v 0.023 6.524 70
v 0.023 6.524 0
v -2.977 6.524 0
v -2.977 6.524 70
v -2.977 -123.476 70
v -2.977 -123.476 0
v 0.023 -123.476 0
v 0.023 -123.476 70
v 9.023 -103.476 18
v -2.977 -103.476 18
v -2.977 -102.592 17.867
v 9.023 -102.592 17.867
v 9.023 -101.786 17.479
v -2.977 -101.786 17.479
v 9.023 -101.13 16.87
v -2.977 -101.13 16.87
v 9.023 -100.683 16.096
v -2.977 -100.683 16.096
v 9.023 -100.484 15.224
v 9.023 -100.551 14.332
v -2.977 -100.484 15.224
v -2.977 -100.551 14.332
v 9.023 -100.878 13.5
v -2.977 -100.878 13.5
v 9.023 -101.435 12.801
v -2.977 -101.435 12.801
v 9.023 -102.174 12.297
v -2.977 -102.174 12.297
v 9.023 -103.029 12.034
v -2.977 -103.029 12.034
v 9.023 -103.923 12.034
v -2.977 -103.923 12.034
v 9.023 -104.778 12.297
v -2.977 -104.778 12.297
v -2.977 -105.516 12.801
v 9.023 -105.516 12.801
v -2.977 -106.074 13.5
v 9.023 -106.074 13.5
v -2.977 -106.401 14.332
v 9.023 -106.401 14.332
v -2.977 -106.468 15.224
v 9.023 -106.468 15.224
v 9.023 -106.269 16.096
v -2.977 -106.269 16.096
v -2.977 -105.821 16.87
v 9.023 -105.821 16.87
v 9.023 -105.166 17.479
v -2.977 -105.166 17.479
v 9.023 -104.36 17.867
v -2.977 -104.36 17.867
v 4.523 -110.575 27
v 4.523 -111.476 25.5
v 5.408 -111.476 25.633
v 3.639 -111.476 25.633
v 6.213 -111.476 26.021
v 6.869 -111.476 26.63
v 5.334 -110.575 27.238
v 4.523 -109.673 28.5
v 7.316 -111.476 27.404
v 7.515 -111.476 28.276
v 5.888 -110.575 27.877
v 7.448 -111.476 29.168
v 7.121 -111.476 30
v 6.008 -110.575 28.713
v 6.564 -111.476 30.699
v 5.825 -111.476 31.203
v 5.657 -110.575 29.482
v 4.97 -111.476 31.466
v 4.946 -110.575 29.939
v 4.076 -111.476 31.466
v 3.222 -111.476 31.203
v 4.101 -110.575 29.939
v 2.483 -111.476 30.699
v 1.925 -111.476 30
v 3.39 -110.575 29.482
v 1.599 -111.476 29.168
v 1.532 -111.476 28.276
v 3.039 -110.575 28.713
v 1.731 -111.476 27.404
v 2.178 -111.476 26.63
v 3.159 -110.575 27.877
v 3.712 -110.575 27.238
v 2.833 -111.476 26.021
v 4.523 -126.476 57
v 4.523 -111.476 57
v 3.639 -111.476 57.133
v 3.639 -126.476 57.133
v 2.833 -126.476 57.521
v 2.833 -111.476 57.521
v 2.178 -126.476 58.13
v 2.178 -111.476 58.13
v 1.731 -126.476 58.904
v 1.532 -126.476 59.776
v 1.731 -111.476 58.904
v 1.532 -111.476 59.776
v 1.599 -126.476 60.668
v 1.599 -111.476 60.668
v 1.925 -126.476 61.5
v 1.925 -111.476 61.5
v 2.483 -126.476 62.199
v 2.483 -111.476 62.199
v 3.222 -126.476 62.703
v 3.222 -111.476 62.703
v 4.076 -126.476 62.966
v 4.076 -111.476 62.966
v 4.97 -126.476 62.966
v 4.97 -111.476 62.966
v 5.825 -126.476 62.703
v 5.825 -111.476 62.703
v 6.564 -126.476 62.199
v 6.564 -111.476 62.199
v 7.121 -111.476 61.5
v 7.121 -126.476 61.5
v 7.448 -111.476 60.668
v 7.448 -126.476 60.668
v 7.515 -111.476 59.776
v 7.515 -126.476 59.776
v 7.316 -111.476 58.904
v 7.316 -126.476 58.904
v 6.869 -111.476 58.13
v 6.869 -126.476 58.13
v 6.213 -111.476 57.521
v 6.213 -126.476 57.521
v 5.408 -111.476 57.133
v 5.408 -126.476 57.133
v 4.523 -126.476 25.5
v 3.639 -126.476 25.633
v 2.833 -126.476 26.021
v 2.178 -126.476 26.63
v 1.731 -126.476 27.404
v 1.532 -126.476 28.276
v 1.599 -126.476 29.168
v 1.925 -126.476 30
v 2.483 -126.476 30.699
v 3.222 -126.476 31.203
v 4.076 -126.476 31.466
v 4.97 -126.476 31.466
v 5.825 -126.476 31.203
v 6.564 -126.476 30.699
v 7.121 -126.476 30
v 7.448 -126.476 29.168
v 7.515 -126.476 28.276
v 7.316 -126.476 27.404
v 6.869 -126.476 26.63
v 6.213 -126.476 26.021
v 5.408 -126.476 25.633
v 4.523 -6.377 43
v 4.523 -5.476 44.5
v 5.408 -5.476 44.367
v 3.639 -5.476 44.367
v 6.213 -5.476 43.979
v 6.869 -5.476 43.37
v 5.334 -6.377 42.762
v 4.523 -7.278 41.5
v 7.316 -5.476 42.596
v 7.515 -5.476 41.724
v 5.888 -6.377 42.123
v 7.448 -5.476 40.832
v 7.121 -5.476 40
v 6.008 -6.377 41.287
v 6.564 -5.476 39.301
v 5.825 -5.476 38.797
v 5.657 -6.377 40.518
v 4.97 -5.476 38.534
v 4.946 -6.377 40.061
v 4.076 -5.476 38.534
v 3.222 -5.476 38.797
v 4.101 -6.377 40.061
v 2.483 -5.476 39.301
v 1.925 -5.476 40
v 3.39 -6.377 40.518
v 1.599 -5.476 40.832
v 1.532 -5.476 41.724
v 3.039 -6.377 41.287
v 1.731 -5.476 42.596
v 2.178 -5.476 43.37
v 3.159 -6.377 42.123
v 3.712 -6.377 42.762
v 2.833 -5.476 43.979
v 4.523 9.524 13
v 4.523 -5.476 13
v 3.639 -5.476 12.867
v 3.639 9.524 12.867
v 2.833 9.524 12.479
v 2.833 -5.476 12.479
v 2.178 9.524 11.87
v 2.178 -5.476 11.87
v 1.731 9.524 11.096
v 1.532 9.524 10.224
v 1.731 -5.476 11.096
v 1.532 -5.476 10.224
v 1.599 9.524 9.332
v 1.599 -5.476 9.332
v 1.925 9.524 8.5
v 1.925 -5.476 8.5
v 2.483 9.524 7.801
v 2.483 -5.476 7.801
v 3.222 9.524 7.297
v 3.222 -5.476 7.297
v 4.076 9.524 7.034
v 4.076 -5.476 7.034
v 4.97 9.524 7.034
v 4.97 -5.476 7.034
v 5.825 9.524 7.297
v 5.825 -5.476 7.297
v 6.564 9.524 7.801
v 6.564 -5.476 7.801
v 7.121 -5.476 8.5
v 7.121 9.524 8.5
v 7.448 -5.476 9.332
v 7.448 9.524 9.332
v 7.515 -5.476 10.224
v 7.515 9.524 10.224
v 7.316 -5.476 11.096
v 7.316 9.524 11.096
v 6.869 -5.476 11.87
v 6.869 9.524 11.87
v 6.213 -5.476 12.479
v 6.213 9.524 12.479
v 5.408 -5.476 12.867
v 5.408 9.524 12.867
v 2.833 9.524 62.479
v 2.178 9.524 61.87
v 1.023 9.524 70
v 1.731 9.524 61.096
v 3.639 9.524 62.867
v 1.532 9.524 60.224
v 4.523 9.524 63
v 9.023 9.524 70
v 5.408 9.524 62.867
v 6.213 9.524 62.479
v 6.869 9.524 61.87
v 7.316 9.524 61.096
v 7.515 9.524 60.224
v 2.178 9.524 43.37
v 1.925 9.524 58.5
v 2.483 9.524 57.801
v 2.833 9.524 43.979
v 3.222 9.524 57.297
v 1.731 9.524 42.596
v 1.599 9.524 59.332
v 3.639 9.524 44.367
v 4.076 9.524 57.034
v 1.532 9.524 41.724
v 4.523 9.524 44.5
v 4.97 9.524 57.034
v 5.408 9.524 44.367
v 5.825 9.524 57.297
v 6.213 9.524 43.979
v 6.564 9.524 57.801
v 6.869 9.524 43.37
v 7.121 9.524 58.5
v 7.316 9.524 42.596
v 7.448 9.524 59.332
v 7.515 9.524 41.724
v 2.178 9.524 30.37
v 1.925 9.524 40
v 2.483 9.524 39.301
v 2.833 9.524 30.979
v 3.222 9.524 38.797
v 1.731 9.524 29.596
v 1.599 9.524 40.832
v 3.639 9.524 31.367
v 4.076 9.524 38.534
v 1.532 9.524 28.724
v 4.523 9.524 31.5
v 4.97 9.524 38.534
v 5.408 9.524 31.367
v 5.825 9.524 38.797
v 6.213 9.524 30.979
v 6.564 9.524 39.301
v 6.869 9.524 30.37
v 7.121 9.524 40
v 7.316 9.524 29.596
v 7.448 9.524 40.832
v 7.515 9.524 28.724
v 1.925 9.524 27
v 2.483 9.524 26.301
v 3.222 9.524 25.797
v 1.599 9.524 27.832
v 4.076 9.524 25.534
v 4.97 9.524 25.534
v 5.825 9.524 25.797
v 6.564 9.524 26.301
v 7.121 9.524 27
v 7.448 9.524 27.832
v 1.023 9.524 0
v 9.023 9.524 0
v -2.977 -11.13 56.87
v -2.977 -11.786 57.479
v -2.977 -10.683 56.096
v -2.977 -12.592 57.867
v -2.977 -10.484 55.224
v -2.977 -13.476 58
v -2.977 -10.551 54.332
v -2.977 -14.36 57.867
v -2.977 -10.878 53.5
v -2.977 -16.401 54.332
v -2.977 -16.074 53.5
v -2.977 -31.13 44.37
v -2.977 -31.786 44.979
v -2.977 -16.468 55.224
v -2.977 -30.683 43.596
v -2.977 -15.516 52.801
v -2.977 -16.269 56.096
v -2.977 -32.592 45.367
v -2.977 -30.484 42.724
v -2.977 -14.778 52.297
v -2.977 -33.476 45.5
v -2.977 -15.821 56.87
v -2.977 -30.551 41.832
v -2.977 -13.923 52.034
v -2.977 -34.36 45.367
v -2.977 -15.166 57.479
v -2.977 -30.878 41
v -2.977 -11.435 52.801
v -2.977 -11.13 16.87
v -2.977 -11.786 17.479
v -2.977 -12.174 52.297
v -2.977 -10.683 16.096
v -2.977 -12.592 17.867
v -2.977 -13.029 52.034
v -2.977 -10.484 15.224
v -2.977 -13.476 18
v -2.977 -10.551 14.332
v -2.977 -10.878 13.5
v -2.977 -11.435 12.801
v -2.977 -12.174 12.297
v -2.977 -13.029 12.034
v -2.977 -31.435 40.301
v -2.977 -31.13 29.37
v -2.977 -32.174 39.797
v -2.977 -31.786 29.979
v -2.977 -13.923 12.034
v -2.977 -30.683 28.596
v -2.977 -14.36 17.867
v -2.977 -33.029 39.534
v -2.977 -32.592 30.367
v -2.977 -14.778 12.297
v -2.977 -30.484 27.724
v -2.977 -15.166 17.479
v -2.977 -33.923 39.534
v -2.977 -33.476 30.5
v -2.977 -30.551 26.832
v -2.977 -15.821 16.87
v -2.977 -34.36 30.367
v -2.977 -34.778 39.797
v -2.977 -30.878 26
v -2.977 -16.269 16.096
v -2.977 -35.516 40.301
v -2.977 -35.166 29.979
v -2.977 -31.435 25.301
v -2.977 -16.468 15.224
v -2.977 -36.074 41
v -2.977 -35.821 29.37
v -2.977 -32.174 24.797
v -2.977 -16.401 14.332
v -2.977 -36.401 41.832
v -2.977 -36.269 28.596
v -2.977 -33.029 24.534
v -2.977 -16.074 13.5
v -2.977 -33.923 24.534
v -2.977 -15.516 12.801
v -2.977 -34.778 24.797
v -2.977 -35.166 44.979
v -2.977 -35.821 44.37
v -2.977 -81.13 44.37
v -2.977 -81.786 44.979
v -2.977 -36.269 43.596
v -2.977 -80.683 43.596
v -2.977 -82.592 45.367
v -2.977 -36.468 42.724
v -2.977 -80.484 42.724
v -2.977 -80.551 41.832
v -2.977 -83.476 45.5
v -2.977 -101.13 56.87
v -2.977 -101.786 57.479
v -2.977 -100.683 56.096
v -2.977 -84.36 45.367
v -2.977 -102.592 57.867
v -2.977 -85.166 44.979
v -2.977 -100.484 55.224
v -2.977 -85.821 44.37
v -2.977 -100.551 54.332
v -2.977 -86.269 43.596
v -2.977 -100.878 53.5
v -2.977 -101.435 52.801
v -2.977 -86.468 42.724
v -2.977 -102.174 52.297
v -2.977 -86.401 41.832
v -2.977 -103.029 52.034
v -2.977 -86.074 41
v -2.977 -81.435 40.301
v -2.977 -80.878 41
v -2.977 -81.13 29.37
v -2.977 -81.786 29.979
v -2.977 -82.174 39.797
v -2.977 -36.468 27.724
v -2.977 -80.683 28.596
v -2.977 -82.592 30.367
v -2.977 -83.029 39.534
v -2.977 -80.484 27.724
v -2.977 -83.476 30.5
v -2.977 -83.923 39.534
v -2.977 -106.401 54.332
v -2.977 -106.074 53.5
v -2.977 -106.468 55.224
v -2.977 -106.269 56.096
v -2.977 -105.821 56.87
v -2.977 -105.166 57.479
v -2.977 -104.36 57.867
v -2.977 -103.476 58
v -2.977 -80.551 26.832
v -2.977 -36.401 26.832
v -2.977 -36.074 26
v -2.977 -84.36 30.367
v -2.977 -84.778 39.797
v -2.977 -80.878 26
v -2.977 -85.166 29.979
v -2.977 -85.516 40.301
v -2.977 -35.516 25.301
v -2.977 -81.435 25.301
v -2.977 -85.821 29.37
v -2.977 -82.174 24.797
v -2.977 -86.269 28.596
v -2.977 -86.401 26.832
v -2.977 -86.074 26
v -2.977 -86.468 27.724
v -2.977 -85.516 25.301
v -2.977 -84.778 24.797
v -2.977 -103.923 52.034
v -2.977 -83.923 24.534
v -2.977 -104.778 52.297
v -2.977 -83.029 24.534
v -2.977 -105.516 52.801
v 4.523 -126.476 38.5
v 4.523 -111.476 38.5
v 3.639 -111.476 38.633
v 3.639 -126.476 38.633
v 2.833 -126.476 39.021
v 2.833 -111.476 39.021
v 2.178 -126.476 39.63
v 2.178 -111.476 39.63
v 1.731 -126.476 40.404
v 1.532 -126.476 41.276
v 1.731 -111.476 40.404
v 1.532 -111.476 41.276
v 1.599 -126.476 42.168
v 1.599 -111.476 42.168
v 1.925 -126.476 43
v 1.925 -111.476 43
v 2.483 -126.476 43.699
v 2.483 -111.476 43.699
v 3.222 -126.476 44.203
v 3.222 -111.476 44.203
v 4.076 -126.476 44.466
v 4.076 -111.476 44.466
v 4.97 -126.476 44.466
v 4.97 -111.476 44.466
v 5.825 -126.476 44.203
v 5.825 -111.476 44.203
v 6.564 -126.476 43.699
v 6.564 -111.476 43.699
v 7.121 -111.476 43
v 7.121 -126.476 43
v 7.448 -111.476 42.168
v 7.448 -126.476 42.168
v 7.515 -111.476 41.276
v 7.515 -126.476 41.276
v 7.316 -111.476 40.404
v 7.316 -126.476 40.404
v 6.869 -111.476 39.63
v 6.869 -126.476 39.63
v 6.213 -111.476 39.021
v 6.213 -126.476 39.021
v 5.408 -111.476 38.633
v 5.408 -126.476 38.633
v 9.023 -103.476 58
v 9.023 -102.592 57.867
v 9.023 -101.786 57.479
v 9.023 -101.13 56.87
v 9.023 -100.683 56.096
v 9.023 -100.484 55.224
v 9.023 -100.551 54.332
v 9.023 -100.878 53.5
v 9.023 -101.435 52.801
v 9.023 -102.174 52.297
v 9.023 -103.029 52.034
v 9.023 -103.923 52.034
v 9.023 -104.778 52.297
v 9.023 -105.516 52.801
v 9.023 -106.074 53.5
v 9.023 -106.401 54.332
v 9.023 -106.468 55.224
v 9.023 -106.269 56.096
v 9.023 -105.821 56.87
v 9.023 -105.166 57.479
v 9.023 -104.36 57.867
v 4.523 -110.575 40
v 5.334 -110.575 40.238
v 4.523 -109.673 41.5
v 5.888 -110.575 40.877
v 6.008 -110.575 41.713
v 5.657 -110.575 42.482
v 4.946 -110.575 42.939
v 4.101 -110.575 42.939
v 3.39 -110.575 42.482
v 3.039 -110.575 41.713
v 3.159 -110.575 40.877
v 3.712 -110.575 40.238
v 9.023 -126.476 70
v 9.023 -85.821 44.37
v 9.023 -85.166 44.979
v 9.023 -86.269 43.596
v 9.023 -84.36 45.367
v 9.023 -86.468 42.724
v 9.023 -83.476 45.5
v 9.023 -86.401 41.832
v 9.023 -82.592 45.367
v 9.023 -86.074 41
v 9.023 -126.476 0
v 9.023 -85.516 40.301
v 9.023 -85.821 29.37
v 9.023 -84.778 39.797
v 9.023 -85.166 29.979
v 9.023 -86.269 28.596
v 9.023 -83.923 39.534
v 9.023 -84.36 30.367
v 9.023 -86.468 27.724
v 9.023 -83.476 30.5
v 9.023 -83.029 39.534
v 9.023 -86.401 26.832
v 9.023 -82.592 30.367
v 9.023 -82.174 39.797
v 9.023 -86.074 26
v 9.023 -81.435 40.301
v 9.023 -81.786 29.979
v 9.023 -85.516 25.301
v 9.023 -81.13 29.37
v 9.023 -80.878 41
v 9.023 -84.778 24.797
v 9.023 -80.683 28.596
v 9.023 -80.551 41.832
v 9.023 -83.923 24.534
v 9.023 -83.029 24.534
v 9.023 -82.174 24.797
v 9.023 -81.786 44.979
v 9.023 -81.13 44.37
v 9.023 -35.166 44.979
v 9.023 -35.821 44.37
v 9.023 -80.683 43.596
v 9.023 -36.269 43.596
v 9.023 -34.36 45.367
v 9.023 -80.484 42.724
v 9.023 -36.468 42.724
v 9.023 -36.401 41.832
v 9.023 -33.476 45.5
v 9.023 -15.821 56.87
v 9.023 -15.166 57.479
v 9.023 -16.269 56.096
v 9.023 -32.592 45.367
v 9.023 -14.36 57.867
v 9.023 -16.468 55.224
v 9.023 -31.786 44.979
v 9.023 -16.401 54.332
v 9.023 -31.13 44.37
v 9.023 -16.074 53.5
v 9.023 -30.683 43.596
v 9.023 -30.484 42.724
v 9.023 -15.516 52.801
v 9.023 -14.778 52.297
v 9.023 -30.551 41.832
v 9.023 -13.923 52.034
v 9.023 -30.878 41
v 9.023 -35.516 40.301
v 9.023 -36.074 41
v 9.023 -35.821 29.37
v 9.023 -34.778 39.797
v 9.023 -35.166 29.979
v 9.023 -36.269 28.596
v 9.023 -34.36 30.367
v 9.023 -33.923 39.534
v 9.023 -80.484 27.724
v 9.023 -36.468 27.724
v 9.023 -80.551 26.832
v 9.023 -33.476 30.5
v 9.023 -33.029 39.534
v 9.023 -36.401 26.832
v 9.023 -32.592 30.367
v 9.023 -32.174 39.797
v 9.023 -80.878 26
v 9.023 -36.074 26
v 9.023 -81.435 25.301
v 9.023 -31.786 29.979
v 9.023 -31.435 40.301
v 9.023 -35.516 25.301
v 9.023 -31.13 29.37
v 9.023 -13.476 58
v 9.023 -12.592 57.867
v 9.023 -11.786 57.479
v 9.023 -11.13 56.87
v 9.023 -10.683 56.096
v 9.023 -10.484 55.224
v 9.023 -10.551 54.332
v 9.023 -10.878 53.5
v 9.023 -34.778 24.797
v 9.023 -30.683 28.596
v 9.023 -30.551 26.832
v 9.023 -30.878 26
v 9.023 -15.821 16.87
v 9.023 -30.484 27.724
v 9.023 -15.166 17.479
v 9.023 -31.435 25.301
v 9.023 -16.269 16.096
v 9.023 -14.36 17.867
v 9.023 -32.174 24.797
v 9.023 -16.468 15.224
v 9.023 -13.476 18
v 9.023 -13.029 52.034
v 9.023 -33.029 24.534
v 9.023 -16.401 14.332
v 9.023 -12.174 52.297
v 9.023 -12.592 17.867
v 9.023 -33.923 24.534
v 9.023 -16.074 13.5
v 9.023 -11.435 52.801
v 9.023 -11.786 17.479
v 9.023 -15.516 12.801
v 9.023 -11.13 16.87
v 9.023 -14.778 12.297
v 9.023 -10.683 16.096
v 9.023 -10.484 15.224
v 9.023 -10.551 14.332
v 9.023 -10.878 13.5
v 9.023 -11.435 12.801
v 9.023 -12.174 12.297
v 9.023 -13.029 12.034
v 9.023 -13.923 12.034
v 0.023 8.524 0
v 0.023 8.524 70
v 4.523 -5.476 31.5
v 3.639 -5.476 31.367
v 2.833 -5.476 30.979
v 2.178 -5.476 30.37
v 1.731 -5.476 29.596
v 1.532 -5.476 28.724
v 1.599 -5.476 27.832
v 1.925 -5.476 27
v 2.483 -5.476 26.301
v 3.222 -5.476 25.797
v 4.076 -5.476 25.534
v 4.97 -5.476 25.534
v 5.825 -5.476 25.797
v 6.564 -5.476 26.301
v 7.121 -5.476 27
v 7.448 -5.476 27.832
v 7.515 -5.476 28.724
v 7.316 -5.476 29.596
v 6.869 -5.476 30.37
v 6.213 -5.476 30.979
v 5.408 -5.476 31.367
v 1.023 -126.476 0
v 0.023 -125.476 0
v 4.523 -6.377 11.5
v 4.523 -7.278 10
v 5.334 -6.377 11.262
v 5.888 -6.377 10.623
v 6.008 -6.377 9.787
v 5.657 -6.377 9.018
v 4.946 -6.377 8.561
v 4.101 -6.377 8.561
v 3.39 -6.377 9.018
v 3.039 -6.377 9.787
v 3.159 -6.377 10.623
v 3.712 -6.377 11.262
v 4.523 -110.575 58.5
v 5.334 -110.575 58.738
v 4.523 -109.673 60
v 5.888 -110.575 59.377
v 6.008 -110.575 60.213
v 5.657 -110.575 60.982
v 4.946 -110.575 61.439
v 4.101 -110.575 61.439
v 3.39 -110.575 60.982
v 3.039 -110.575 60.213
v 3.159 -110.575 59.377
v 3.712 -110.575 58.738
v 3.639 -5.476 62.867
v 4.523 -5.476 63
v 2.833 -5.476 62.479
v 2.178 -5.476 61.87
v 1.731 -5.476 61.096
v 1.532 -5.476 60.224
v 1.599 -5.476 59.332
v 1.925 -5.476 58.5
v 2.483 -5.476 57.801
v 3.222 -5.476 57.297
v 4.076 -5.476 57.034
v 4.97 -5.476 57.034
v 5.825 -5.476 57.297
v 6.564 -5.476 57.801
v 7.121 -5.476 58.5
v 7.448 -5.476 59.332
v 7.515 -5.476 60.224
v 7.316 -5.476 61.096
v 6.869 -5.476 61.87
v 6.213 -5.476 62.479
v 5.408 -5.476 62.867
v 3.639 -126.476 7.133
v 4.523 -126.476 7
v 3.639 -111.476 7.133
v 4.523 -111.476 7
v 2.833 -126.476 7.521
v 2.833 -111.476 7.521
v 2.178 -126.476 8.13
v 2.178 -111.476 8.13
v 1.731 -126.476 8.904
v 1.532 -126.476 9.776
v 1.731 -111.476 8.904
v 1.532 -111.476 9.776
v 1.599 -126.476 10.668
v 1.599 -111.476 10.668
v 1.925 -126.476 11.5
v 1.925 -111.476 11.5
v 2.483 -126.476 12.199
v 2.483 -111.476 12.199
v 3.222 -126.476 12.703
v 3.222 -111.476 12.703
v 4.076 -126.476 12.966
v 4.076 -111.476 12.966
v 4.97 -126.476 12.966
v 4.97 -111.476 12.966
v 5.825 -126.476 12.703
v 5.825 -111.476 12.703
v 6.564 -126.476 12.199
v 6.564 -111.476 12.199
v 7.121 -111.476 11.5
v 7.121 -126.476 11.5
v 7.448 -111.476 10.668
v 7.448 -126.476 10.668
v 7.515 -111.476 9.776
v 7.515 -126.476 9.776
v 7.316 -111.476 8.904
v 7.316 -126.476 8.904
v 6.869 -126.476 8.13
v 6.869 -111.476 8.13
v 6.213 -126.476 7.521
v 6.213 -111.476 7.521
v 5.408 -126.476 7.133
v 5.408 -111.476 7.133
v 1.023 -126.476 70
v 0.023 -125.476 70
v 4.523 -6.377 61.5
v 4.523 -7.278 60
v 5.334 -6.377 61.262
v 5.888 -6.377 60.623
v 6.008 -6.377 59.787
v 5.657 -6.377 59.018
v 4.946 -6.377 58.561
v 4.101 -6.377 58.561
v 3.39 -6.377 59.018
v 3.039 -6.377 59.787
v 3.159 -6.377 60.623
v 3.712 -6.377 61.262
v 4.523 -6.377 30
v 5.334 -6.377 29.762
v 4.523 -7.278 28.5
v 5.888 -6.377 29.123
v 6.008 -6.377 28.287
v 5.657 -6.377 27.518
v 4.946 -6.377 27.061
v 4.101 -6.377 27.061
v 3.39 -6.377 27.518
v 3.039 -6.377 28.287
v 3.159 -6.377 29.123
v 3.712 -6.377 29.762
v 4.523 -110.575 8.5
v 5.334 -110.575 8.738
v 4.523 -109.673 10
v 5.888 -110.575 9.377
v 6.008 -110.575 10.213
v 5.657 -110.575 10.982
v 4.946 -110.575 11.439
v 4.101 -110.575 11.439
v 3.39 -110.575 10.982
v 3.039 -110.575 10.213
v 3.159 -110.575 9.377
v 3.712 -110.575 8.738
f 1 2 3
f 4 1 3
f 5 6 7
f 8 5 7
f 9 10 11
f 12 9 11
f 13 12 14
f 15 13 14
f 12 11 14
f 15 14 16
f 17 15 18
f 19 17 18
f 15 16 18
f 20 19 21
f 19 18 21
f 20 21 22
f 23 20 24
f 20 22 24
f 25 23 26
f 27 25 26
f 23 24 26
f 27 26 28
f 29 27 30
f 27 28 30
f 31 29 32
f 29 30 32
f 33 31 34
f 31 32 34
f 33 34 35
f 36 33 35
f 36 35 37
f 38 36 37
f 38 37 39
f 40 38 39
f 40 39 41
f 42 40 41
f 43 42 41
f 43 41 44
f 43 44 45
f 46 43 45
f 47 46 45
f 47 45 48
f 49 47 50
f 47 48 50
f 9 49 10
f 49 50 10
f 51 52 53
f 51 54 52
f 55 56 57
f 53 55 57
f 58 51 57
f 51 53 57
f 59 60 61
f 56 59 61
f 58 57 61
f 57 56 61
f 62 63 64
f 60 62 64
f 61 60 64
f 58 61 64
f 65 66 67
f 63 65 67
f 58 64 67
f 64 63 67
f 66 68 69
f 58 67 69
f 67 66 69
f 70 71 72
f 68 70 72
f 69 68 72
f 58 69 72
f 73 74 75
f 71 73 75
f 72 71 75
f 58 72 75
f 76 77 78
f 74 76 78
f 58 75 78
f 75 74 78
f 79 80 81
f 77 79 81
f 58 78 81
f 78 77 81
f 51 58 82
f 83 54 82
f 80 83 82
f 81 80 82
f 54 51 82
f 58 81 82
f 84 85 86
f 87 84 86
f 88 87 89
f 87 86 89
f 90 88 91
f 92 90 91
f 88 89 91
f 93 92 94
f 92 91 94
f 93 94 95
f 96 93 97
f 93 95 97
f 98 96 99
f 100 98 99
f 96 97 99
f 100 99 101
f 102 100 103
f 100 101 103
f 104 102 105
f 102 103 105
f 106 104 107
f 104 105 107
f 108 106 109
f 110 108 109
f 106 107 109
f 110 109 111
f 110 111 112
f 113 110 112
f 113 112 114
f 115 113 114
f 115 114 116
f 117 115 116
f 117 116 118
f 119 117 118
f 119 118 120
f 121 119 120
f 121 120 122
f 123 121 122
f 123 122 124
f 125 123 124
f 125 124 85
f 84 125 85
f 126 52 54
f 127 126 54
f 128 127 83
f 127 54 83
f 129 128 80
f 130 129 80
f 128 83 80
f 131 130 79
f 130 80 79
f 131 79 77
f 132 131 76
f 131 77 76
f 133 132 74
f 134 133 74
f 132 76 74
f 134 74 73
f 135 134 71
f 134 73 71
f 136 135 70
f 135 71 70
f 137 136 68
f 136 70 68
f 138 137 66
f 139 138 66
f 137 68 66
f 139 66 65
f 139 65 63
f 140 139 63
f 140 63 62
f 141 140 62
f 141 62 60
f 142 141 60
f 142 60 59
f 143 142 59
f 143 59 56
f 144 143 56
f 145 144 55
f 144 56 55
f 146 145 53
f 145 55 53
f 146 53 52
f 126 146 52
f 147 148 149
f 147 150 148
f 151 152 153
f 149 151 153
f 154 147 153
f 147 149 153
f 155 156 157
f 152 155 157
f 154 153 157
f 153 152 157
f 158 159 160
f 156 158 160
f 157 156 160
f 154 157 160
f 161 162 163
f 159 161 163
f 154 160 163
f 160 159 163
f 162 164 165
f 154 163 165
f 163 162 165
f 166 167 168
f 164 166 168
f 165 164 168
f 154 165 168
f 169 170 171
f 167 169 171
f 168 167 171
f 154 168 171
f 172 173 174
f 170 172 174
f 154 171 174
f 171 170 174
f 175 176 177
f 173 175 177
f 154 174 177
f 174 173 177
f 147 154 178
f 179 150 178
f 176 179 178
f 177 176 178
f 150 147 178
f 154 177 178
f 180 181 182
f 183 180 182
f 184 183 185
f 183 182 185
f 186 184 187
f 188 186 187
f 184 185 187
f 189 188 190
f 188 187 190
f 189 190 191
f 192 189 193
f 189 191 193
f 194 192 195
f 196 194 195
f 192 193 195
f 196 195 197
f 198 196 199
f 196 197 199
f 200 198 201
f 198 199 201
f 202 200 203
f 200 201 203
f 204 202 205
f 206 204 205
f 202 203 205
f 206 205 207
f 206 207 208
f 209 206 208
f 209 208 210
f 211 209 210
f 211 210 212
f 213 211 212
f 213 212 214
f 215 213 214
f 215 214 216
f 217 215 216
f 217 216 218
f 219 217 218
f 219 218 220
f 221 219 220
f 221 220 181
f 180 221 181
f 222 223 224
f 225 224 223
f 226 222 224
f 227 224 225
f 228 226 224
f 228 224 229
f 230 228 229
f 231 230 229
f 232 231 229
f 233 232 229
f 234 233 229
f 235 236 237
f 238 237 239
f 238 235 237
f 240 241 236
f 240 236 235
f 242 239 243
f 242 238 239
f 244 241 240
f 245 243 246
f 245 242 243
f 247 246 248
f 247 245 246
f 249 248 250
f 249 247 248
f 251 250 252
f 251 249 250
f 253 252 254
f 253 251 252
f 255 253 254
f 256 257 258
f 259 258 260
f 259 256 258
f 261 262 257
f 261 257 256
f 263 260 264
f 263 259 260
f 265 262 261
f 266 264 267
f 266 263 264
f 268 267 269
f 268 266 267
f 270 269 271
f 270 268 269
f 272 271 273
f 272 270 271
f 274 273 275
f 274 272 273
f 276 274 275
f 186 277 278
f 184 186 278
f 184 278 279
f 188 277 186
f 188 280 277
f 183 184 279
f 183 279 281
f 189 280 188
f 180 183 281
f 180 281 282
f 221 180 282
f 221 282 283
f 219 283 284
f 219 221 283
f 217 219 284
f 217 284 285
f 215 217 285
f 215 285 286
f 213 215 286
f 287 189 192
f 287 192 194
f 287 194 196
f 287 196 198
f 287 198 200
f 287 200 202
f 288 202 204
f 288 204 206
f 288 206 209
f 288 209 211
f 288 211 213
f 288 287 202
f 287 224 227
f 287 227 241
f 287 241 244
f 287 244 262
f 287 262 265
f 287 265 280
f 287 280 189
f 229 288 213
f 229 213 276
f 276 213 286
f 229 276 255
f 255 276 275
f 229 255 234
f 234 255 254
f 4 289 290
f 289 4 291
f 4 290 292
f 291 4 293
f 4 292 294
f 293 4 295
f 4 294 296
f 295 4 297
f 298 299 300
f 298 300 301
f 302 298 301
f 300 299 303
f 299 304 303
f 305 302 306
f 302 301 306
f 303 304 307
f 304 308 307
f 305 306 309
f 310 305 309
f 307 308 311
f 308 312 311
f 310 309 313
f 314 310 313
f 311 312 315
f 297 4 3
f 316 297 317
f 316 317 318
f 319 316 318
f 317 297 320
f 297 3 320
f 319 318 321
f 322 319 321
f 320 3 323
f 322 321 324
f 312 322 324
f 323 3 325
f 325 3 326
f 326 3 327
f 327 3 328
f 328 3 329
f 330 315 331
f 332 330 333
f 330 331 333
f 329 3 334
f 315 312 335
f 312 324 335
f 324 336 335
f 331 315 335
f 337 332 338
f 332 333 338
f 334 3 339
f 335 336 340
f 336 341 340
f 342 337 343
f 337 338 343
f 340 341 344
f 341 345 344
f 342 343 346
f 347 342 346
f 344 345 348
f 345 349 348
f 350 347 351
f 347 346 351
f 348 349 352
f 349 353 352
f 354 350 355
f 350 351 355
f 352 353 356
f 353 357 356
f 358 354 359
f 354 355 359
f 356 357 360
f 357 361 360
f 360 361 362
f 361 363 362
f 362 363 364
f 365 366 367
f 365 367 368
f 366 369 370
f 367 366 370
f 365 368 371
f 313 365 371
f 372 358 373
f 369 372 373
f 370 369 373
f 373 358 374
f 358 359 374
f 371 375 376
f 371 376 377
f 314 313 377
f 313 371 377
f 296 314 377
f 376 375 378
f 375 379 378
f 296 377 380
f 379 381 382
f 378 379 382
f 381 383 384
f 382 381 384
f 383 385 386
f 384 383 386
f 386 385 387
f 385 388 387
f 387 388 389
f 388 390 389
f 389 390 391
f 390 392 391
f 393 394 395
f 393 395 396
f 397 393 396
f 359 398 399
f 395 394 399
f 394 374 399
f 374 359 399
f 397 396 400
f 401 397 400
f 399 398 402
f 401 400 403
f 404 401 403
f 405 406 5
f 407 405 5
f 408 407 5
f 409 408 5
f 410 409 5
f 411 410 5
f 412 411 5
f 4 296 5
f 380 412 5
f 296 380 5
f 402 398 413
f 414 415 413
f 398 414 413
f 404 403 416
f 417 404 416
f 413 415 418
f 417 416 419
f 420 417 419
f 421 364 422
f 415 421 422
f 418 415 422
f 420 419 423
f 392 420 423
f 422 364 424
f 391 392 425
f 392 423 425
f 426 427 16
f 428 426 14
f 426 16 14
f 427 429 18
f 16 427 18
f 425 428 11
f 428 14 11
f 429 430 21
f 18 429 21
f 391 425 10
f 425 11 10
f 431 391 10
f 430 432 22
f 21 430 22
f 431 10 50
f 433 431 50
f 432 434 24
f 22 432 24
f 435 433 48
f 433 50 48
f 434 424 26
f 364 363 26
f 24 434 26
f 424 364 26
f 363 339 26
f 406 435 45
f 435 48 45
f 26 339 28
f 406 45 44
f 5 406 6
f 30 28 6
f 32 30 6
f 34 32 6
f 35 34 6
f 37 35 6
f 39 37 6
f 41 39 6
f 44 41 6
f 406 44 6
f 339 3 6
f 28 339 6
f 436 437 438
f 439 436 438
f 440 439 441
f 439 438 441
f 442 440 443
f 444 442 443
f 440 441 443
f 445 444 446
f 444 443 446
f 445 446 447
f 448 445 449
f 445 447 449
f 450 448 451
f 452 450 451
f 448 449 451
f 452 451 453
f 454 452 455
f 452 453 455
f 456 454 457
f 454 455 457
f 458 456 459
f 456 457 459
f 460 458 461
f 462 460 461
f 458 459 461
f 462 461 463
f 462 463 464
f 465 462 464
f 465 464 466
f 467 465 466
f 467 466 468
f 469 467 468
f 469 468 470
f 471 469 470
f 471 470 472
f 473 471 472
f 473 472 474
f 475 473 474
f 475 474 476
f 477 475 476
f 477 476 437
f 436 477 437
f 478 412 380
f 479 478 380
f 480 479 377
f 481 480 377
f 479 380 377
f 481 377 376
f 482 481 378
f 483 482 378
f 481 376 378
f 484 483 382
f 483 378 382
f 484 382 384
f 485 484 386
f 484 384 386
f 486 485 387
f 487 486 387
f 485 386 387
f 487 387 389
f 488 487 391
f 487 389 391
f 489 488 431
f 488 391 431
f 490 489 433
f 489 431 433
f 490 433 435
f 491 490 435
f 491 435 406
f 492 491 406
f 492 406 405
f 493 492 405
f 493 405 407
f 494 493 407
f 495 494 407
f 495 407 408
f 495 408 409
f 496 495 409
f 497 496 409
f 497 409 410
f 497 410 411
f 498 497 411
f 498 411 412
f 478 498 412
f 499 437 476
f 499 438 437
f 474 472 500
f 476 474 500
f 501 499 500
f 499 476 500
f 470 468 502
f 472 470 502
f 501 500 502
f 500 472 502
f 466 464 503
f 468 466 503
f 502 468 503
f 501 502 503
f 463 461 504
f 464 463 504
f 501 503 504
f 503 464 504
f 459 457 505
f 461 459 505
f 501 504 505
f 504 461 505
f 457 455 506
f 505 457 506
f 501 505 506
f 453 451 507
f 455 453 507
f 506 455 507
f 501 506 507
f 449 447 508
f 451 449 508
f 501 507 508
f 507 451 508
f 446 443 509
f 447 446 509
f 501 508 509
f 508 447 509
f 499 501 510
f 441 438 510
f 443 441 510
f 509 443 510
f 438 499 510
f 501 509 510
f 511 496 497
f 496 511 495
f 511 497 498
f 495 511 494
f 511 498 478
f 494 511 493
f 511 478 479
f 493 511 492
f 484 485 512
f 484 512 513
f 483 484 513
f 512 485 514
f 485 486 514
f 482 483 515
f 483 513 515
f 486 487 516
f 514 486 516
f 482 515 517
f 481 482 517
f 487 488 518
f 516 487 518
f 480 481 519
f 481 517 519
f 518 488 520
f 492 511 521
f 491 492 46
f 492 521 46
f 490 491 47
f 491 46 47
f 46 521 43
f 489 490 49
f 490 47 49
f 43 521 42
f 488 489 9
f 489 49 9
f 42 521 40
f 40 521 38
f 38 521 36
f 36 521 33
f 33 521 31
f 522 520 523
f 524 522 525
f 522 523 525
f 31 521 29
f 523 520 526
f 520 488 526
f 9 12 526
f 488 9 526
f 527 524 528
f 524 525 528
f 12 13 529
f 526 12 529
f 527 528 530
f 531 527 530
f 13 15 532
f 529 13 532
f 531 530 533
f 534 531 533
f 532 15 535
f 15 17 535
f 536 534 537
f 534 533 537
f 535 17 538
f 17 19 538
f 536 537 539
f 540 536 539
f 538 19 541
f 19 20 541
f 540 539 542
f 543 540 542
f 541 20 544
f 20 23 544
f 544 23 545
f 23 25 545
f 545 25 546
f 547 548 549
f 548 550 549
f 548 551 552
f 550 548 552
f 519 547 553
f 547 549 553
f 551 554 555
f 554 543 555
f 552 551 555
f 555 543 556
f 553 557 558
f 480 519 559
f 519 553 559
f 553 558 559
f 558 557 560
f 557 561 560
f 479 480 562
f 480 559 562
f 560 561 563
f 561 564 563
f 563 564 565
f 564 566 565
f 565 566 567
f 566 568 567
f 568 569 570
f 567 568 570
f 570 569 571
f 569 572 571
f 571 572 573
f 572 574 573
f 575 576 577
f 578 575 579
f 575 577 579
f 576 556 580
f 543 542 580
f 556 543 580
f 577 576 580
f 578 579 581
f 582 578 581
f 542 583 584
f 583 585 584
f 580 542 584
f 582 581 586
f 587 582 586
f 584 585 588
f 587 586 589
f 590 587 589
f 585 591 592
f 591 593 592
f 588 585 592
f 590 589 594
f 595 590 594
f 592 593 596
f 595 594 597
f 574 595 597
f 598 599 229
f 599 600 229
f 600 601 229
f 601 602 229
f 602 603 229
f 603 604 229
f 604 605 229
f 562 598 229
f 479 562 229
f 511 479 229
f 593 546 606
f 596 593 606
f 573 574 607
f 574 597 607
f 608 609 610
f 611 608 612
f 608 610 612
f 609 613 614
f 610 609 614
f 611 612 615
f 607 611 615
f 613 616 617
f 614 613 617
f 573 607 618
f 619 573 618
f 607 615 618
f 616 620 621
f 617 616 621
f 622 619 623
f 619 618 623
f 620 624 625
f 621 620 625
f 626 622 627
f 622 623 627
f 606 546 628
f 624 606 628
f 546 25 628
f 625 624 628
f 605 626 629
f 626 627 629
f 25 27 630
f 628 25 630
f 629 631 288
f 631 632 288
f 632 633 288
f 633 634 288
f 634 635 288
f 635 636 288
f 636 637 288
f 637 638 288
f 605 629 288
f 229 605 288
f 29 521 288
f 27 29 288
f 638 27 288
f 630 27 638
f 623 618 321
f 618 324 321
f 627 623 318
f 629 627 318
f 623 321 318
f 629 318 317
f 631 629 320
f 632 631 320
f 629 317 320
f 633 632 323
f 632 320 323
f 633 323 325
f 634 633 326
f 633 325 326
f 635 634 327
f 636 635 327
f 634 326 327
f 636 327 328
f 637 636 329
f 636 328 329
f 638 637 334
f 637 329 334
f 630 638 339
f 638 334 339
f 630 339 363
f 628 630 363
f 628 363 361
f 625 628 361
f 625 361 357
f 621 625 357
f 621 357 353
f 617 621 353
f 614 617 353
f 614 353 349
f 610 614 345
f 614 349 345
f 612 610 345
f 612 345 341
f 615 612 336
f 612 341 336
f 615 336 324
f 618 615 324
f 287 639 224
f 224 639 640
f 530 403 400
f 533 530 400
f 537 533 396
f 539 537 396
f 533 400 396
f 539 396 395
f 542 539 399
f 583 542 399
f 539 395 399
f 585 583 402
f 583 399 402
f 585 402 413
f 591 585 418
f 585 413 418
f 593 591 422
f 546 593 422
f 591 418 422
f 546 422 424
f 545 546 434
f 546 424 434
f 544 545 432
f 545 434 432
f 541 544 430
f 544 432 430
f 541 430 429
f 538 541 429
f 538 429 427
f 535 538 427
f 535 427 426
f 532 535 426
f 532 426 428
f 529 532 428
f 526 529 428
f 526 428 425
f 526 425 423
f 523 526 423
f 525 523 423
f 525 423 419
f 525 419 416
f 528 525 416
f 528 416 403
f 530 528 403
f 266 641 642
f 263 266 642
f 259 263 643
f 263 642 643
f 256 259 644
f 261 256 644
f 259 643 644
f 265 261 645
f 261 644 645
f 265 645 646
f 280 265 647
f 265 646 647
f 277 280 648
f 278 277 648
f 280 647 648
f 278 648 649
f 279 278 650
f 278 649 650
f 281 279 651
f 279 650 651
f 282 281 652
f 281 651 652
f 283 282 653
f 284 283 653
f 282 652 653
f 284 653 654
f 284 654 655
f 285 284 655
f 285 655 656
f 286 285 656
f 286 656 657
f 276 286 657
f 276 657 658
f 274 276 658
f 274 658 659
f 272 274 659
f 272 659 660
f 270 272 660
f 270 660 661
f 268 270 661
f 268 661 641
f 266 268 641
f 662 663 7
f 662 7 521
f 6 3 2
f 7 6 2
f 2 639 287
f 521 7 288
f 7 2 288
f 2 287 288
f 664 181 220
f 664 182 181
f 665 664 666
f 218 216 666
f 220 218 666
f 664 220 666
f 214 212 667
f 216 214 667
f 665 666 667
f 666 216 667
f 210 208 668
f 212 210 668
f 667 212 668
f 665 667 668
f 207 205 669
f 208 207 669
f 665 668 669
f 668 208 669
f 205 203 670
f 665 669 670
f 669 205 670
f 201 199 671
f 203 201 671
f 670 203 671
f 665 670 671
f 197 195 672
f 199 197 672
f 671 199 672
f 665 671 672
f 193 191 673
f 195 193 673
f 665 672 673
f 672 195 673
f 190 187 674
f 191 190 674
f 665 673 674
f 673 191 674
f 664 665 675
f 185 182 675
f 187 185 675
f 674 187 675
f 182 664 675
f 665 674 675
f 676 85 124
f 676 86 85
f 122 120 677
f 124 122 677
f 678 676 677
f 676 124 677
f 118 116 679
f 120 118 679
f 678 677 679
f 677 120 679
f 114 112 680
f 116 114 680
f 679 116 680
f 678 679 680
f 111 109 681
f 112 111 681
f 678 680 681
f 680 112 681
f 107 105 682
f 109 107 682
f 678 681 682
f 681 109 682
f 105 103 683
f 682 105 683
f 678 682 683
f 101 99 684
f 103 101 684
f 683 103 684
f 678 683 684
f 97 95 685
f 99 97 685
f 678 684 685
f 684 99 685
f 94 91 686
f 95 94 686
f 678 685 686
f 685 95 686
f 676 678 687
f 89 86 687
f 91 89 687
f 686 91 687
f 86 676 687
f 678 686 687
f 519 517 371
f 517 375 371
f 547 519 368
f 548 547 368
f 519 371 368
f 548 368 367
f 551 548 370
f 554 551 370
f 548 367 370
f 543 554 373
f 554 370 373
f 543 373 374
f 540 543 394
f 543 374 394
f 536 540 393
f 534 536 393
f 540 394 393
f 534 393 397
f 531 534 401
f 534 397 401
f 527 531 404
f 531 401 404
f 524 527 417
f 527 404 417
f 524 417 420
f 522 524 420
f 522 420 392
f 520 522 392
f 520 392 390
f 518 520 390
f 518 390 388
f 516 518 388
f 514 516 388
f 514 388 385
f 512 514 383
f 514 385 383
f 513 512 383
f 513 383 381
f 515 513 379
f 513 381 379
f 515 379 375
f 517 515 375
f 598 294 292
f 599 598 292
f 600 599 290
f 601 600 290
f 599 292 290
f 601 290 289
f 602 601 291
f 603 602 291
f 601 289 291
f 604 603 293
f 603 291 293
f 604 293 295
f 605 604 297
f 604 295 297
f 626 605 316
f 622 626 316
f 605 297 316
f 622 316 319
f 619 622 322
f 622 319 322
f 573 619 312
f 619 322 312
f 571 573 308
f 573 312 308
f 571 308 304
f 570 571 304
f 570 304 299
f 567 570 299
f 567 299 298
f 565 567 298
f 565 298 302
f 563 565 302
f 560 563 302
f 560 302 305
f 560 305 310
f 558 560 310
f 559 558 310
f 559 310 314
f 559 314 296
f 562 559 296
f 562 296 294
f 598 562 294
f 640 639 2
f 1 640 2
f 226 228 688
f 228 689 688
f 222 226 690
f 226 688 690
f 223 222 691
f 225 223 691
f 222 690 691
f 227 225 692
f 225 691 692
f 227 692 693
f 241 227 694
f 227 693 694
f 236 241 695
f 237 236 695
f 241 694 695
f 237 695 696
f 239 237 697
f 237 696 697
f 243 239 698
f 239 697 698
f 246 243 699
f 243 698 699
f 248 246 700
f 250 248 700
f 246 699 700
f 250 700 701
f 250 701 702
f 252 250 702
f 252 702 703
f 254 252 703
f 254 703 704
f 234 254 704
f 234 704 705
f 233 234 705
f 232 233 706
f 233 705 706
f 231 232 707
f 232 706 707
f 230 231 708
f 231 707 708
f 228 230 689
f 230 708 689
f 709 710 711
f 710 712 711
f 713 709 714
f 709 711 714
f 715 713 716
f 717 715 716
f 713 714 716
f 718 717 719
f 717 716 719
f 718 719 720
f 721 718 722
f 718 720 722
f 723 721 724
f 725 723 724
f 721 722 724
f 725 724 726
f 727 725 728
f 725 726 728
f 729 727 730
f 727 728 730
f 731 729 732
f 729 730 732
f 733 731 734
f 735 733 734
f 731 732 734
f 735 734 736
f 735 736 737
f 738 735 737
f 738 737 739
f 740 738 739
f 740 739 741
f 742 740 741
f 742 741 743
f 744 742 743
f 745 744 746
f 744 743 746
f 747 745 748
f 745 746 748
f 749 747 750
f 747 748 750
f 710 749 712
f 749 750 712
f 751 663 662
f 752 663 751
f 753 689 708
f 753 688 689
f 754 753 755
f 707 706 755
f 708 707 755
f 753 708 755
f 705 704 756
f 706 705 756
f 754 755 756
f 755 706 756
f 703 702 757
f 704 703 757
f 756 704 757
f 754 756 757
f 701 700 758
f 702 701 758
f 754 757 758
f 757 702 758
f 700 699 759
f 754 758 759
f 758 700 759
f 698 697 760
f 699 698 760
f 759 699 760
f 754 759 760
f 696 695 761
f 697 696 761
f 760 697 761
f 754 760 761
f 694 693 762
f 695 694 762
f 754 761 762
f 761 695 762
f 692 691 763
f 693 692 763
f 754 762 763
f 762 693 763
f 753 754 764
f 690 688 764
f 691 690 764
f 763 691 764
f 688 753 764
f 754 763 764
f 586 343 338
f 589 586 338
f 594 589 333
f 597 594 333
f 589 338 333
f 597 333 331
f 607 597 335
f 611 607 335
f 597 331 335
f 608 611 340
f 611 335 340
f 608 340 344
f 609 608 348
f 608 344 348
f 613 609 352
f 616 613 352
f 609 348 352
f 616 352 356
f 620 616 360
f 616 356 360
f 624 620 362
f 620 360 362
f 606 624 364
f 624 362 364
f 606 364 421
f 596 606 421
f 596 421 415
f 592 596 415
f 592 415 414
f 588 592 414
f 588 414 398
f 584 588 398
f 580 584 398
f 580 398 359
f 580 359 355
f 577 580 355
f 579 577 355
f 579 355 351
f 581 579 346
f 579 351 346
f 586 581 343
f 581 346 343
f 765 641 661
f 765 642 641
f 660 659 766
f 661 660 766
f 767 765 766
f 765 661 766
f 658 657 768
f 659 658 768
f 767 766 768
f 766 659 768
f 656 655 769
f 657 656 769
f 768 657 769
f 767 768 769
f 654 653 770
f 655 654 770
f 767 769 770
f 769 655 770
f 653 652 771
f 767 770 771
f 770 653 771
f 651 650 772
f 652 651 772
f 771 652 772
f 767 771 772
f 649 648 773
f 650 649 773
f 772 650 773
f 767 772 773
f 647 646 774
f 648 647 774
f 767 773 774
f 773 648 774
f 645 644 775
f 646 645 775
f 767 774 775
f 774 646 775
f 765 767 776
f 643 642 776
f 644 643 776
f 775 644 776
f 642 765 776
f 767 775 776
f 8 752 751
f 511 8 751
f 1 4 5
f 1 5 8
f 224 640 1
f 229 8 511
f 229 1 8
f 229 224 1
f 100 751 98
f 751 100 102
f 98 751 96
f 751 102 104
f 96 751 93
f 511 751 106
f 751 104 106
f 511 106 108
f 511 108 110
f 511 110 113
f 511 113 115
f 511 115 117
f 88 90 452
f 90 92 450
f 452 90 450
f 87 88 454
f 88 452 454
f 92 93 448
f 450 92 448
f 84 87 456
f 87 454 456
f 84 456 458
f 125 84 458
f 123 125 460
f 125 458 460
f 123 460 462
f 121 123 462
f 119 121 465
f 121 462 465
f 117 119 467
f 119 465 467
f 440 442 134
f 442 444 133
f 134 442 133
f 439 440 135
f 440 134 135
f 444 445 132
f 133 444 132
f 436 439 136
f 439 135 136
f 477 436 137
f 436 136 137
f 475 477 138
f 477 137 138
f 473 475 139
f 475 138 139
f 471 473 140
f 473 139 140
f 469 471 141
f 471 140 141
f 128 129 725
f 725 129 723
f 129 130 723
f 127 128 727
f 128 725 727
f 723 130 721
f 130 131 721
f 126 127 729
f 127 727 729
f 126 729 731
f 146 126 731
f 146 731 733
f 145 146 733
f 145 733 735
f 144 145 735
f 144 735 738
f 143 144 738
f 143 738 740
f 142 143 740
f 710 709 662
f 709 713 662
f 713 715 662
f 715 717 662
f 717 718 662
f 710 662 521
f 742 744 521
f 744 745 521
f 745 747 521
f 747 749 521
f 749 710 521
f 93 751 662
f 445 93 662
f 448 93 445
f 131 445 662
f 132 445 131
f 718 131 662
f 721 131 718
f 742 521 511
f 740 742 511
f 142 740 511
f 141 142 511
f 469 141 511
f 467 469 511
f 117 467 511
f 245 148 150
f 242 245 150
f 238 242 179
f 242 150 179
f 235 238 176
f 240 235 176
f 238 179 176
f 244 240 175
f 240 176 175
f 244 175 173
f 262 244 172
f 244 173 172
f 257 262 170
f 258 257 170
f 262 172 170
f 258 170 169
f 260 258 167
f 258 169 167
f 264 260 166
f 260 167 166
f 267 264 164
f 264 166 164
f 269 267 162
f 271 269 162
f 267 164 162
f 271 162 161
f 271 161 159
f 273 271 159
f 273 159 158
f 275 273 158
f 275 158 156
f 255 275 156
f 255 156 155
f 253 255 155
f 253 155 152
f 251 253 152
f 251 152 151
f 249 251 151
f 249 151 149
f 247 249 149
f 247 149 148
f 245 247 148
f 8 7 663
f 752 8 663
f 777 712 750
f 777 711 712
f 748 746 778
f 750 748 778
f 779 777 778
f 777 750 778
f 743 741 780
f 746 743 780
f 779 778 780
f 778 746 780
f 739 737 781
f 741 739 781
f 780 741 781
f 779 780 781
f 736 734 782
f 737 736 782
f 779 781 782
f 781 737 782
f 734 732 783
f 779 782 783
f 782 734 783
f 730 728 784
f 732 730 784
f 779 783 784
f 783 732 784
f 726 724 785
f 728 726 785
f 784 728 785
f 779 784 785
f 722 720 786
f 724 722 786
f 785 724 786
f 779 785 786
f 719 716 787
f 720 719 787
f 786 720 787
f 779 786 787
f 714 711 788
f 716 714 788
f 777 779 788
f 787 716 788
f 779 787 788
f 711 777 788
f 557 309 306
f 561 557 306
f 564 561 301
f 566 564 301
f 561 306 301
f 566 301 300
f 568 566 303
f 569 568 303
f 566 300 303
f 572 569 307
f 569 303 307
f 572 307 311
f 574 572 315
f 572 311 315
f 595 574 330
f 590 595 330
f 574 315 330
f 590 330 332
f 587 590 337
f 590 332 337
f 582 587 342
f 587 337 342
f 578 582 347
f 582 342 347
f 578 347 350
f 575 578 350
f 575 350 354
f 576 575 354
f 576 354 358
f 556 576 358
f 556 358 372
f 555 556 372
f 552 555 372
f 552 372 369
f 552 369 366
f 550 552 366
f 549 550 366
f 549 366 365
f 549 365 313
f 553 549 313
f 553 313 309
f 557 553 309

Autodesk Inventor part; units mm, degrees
ref_plane "YZ Plane" through (0, 0, 0) normal (1, 0, 0) x (0, 1, 0)
ref_plane "XZ Plane" through (0, 0, 0) normal (0, 1, 0) x (-1, 0, 0)
ref_plane "XY Plane" through (0, 0, 0) normal (0, 0, 1) x (1, 0, 0)
sketch "Sketch1" plane through (0, 0, 0) normal (0, 0, 1) x (1, 0, 0)
  line L0 (0.0233, 9.5241) -> (9.0233, 9.5241)
  line L1 (0.0233, 9.5241) -> (0.0233, 6.5241)
  line L2 (0.0233, 6.5241) -> (-2.9767, 6.5241)
  line L3 (-2.9767, 6.5241) -> (-2.9767, -123.4759)
  line L4 (-2.9767, -123.4759) -> (0.0233, -123.4759)
  line L5 (0.0233, -123.4759) -> (0.0233, -126.4759)
  line L6 (0.0233, -126.4759) -> (9.0233, -126.4759)
  line L7 (9.0233, -126.4759) -> (9.0233, 9.5241)
  dimension "d0" = 9
  dimension "d1" = 3
  dimension "d2" = 3
  dimension "d3" = 130
  dimension "d4" = 3
  dimension "d5" = 9
extrude "Extrusion1" add sketch "Sketch1" along normal blind 70
sketch "Sketch2" plane through (0.0233, 9.5241, 0) normal (0, 1, 0) x (1, 0, 0)
  circle A0 centre (4.5, -10) radius 3
  circle A1 centre (4.5, -28.5) radius 3
  circle A2 centre (4.5, -41.5) radius 3
  circle A3 centre (4.5, -60) radius 3
  line L0 (9, -70) -> (0, -70) projected
  line L1 (9, 0) -> (0, 0) projected
  line L2 (0, 0) -> (0, -70) projected
  point P0 (-0.0233, 0)
  dimension "d8" = 6
  dimension "d9" = 6
  dimension "d10" = 6
  dimension "d11" = 6
  dimension "d12" = 10
  dimension "d16" = 10
  dimension "d18" = 4.5
  dimension "d19" = 4.5
  dimension "d20" = 4.5
  dimension "d21" = 4.5
  dimension "d135" = 28.5
  dimension "d136" = 28.5
sketch "Sketch3" plane through (0.0233, -126.4759, 0) normal (0, -1, 0) x (1, 0, 0)
  circle A0 centre (4.5, 10) radius 3
  circle A1 centre (4.5, 28.5) radius 3
  circle A2 centre (4.5, 41.5) radius 3
  circle A3 centre (4.5, 60) radius 3
  line L0 (0, 70) -> (9, 70) projected
  line L1 (0, 0) -> (9, 0) projected
  line L2 (0, 0) -> (0, 70) projected
  point P0 (-0.0233, 0)
  dimension "d38" = 6
  dimension "d39" = 6
  dimension "d40" = 6
  dimension "d41" = 6
  dimension "d42" = 10
  dimension "d43" = 10
  dimension "d46" = 4.5
  dimension "d47" = 4.5
  dimension "d48" = 4.5
  dimension "d49" = 4.5
  dimension "d137" = 28.5
  dimension "d138" = 28.5
sketch "Sketch4" plane through (-2.9767, -123.4759, 0) normal (-1, 0, 0) x (0, 0, 1)
  circle A0 centre (15, 110) radius 3
  circle A1 centre (27.5, 90) radius 3
  circle A2 centre (42.5, 90) radius 3
  circle A3 centre (55, 110) radius 3
  line L0 (0, 133) -> (70, 133) projected
  line L1 (0, 130) -> (0, 0) projected
  line L2 (70, 130) -> (70, 0) projected
  line L3 (70, -3) -> (70, 133) projected
  line L4 (70, 65) -> (60.0222, 65)
  circle A4 centre (15, 20) radius 3
  circle A5 centre (27.5, 40) radius 3
  circle A6 centre (42.5, 40) radius 3
  circle A7 centre (55, 20) radius 3
  circle A8 centre (15, 110) radius 5.125
  circle A9 centre (27.5, 90) radius 5.125
  circle A10 centre (42.5, 90) radius 5.125
  circle A11 centre (55, 110) radius 5.125
  circle A12 centre (15, 20) radius 5.125
  circle A13 centre (27.5, 40) radius 5.125
  circle A14 centre (42.5, 40) radius 5.125
  circle A15 centre (55, 20) radius 5.125
  circle A16 centre (35, 65) radius 3
  line L5 (35, 65) -> (35, 82.0143)
  circle A17 centre (60, 82.0143) radius 3
  circle A18 centre (45, 82.0143) radius 3
  circle A19 centre (10, 86.2004) radius 3
  point P0 (0, 123.4759)
  dimension "d52" = 6
  dimension "d53" = 6
  dimension "d54" = 6
  dimension "d55" = 6
  dimension "d56" = 23
  dimension "d57" = 43
  dimension "d58" = 43
  dimension "d59" = 23
  dimension "d60" = 15
  dimension "d61" = 15
  dimension "d66" = 10.25
  dimension "d67" = 10.25
  dimension "d68" = 10.25
  dimension "d69" = 10.25
  dimension "d70" = 10.25
  dimension "d71" = 10.25
  dimension "d72" = 10.25
  dimension "d73" = 10.25
  dimension "d76" = 6
  dimension "d77" = 6
  dimension "d78" = 6
  dimension "d79" = 10
  dimension "d80" = 15
  dimension "d83" = 6
  dimension "d85" = 10
  dimension "d133" = 12.5
  dimension "d134" = 12.5
extrude "Extrusion5" cut sketch "Sketch4" against normal blind 21 contours A0 | A1 | A2 | A3 | A4 | A5 | A6 | A7
hole "Agujero1" at (4.5233, 9.5241, 10) at (4.5233, 9.5241, 28.5) at (4.5233, 9.5241, 41.5) at (4.5233, 9.5241, 60) direction (0, -1, 0) diameter 6 depth 15 tip angle 118
hole "Agujero2" at (4.5233, -126.4759, 10) at (4.5233, -126.4759, 28.5) at (4.5233, -126.4759, 41.5) at (4.5233, -126.4759, 60) direction (0, 1, 0) diameter 6 depth 15 tip angle 118
thread "Rosca9" size "M6x1" class "6H" standard "ISO Metric profile" length 10
thread "Rosca10" size "M6x1" class "6H" standard "ISO Metric profile" length 10
thread "Rosca11" size "M6x1" class "6H" standard "ISO Metric profile" length 10
thread "Rosca12" size "M6x1" class "6H" standard "ISO Metric profile" length 10
thread "Rosca13" size "M6x1" class "6H" standard "ISO Metric profile" length 10
thread "Rosca14" size "M6x1" class "6H" standard "ISO Metric profile" length 10
thread "Rosca15" size "M6x1" class "6H" standard "ISO Metric profile" length 10
thread "Rosca16" size "M6x1" class "6H" standard "ISO Metric profile" length 10
chamfer "Chaflán1" distance 1 angle 45 2 edges at (0.0233, 9.5241, 35) (0.0233, -126.4759, 35)
equation "\"d16\" = d12"
equation "\"d136\" = d135"
equation "\"d43\" = d42"
equation "\"d138\" = d137"
properties part number "Vertical Vìnculo Cabezal" material "Aluminum 6061"
